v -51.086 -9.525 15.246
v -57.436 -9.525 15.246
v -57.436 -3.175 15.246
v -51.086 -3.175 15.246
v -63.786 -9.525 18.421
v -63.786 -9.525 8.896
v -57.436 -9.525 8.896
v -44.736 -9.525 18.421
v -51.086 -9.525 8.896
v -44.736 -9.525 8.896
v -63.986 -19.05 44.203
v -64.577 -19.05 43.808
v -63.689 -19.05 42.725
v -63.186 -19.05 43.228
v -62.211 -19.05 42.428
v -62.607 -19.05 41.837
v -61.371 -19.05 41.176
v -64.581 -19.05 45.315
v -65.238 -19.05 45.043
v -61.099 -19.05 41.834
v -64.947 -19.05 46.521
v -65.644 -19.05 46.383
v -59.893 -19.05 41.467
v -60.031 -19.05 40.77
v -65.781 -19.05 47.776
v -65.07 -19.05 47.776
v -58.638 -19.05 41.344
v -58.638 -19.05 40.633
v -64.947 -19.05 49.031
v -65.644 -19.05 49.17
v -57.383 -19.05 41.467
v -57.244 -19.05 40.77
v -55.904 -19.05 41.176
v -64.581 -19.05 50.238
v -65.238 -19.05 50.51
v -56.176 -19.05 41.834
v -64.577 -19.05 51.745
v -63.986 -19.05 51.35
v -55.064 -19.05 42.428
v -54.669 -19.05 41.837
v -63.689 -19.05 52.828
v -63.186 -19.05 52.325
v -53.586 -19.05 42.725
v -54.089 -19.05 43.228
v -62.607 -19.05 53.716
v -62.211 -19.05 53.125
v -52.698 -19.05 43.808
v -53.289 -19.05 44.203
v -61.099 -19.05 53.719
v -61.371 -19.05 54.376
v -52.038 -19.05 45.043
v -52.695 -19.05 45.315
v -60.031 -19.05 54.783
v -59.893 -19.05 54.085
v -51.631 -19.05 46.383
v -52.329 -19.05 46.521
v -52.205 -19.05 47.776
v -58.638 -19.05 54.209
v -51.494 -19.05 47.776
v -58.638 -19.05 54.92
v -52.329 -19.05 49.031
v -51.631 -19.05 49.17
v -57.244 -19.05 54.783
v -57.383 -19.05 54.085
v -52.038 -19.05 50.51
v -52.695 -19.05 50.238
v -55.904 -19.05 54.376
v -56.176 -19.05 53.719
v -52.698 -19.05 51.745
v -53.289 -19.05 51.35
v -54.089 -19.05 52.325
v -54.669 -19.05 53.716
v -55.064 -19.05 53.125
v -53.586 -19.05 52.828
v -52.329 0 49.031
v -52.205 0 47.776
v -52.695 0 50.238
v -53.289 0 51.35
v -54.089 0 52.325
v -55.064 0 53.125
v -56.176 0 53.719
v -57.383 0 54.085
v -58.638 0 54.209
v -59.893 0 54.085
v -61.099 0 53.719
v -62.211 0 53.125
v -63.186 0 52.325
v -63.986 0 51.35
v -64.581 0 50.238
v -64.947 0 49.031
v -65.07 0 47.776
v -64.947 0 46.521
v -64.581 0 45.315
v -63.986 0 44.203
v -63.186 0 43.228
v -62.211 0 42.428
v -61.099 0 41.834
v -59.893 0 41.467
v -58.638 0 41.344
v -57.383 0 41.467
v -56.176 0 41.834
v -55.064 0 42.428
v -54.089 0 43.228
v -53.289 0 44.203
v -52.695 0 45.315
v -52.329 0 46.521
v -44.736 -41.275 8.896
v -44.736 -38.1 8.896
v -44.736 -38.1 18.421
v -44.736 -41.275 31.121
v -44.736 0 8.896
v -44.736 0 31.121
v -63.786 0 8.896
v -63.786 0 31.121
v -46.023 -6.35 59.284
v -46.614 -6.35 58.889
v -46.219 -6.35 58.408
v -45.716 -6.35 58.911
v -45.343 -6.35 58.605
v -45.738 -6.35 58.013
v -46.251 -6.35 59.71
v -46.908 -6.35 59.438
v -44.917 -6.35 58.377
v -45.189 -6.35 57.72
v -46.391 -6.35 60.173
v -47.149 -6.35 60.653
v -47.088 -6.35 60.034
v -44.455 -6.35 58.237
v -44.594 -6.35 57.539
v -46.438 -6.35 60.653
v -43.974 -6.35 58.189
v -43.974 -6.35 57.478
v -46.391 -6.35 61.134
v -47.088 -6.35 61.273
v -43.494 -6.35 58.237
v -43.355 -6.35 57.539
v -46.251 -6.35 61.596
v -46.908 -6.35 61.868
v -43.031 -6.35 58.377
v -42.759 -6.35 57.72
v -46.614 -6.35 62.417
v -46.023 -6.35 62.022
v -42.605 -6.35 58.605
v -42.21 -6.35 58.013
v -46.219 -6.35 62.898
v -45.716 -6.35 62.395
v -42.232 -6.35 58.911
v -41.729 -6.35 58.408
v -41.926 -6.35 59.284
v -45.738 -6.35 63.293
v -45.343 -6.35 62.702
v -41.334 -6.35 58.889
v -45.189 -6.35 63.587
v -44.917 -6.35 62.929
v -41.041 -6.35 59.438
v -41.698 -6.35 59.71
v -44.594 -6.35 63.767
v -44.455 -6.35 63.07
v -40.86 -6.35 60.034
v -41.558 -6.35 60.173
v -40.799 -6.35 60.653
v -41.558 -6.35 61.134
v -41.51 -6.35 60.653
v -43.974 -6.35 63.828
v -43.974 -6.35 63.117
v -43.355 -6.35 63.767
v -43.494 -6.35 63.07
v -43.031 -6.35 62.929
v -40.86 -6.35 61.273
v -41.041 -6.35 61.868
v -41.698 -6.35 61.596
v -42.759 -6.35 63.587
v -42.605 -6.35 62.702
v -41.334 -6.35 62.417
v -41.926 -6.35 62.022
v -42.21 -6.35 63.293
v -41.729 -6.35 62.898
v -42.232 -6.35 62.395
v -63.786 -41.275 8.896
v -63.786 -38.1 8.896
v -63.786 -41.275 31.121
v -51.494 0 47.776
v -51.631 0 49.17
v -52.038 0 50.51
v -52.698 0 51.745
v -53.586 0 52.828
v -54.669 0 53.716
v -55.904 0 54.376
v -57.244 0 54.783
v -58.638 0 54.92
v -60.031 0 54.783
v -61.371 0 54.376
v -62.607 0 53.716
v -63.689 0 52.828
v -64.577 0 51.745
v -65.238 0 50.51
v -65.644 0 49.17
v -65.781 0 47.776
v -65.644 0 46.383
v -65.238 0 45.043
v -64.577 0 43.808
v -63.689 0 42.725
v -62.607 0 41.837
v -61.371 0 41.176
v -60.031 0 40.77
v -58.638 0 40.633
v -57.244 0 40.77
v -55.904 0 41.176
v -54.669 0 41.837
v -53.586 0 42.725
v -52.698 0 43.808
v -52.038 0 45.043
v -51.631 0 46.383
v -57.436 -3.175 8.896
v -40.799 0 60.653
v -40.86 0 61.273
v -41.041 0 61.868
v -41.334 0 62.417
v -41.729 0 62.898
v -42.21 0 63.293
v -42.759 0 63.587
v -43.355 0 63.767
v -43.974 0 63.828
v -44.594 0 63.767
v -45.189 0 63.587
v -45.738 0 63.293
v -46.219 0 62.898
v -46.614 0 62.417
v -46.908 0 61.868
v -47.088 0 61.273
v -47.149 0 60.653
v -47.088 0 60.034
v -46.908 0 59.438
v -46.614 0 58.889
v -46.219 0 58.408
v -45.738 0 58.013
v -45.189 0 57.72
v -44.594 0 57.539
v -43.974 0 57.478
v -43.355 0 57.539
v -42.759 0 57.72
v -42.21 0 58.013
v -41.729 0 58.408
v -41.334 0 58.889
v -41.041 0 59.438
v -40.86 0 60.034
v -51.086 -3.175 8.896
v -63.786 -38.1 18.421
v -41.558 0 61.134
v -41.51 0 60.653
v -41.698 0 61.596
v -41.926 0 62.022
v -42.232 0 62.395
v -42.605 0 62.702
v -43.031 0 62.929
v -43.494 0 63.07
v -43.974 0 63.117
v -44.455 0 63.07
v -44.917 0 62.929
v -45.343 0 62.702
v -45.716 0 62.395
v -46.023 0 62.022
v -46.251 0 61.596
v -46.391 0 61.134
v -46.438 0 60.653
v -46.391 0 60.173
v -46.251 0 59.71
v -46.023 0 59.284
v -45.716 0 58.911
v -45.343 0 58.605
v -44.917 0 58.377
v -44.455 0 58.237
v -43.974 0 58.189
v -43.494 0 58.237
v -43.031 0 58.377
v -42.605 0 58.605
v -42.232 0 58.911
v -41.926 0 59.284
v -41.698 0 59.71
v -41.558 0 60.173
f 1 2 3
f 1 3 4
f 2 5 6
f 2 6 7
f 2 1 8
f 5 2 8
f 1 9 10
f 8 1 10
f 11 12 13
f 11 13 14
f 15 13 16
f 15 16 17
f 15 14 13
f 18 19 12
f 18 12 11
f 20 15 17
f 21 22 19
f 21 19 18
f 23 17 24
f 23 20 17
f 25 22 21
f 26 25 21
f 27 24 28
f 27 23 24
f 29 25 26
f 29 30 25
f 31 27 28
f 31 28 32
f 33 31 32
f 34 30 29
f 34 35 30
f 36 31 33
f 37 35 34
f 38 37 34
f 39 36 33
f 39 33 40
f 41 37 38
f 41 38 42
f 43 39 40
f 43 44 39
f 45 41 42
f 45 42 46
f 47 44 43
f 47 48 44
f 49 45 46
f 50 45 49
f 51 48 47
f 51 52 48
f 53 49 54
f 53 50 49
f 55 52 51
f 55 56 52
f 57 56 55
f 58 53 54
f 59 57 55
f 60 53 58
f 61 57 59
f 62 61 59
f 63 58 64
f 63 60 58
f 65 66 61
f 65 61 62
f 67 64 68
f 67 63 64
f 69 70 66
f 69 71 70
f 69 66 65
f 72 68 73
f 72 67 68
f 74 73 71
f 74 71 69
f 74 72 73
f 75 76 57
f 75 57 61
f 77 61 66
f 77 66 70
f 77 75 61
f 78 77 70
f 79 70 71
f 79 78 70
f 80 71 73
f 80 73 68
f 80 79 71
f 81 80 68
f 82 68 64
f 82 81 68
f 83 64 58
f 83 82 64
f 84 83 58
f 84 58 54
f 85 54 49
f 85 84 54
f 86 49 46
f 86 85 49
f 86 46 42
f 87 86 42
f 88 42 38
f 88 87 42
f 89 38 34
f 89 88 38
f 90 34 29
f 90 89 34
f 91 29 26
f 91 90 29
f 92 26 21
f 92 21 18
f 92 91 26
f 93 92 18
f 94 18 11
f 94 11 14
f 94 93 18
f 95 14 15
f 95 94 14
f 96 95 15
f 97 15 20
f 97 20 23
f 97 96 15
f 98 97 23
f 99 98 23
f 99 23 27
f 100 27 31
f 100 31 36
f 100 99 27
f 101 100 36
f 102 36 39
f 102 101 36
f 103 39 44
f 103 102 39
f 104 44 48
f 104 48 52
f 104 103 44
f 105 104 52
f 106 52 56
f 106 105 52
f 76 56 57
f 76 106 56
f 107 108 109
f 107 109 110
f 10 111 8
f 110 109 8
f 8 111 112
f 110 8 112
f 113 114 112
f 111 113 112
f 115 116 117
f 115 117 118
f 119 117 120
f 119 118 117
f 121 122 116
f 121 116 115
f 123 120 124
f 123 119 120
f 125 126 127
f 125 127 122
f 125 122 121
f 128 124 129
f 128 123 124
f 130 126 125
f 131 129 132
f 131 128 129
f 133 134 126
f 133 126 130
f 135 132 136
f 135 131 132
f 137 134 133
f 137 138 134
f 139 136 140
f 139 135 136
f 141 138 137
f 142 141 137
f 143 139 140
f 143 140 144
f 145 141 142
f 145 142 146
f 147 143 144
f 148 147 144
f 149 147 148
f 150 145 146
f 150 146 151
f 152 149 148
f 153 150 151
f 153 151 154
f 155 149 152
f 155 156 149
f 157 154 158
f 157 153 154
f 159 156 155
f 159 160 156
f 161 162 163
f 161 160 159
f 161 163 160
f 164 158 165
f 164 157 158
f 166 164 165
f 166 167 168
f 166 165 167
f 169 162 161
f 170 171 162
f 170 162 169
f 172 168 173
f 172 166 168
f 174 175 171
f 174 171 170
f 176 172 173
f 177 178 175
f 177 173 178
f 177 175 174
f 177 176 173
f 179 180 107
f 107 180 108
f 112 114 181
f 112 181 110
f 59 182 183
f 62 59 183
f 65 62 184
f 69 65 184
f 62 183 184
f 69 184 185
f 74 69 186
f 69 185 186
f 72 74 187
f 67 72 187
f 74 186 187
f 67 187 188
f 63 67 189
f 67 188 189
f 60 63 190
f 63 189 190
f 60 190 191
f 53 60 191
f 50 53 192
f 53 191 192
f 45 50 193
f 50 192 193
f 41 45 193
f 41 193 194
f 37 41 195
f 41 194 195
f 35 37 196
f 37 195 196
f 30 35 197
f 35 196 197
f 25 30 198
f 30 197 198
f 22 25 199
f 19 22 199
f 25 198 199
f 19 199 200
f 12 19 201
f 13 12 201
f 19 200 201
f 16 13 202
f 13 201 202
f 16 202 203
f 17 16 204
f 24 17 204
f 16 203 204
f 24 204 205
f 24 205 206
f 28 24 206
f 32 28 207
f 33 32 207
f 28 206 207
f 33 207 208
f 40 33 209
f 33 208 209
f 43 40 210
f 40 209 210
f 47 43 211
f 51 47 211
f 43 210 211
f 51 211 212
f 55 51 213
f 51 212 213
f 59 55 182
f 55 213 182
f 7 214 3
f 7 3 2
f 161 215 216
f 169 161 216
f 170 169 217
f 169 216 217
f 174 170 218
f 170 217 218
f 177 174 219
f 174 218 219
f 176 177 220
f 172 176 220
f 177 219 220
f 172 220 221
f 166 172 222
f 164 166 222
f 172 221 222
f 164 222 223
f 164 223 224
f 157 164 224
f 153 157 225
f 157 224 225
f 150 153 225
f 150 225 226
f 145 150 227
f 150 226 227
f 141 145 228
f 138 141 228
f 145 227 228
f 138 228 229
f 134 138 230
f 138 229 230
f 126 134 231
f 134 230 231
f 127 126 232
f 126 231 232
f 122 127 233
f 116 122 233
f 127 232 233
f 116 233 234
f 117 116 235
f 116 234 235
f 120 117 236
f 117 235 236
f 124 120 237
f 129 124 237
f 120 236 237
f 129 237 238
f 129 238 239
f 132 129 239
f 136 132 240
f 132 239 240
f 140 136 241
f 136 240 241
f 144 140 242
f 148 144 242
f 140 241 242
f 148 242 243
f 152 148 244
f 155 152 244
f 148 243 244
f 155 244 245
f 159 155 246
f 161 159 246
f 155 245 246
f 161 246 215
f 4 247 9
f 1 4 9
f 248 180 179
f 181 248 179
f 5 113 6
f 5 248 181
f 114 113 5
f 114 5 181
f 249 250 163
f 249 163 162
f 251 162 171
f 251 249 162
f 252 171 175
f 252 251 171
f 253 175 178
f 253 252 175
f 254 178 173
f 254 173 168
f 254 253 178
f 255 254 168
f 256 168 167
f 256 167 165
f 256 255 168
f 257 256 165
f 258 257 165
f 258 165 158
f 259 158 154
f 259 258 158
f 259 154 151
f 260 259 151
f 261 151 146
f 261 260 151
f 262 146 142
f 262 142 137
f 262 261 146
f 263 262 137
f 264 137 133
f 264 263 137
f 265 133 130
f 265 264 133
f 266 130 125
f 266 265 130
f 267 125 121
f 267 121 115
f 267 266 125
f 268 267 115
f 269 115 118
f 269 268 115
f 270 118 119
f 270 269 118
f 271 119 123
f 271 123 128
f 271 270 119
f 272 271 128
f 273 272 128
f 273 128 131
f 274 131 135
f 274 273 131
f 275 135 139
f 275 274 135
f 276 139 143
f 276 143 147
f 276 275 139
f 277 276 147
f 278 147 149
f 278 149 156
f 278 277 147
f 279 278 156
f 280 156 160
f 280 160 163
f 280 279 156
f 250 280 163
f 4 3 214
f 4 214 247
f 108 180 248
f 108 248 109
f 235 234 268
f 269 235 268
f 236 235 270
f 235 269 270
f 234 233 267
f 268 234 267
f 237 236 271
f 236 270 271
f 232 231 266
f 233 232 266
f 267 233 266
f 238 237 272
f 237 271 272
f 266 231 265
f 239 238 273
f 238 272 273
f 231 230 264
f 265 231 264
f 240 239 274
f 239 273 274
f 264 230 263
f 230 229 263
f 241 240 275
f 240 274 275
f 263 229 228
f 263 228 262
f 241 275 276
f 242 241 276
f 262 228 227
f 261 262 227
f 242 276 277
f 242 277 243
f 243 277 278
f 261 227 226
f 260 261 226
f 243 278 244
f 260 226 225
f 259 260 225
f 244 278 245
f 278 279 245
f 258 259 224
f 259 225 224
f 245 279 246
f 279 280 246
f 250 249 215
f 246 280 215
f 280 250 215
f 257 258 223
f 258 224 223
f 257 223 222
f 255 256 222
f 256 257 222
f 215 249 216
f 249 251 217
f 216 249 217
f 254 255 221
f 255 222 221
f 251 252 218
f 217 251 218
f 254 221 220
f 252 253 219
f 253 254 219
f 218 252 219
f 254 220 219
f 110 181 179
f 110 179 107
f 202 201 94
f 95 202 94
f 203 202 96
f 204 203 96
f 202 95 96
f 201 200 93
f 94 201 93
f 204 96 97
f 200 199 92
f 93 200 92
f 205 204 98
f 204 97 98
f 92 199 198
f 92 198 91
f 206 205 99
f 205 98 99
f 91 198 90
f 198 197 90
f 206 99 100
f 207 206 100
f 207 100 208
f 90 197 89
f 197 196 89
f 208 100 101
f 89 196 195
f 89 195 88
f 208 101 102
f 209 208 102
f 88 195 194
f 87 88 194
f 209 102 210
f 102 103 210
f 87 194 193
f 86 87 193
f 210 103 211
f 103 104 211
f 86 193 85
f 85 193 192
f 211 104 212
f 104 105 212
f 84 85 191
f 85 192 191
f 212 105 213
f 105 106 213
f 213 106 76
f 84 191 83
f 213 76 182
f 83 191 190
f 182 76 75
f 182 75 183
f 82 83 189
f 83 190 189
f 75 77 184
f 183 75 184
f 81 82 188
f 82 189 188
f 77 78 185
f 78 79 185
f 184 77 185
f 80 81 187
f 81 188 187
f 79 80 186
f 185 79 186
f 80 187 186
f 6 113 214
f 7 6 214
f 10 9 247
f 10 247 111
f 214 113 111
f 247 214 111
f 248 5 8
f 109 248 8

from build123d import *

# Parameters (mm, degrees)
F0_R     = 7.14375
F0_R_2   = 6.43255
F1_DEPTH = 19.05
F2_R     = 3.175
F2_R_2   = 2.4638
F3_DEPTH = 6.35
F4_W     = 19.05
F4_H     = 22.225
F5_DEPTH = 41.275
F6_W     = 19.05
F6_H     = 28.575
F7_DEPTH = 9.525
F8_W     = 6.35
F8_H     = 6.35
F9_DEPTH = 6.35


with BuildPart() as f1:
    # F0 (on Front) → F1 (new body)
    with BuildSketch(Plane.XZ):
        with Locations((-58.637682, 47.776416)):
            Circle(F0_R)
        with Locations((-58.637682, 47.776416)):
            Circle(F0_R_2, mode=Mode.SUBTRACT)
    extrude(amount=F1_DEPTH)


with BuildPart() as f3:
    # F2 (on Front) → F3 (new body)
    with BuildSketch(Plane.XZ):
        with Locations((-43.974284, 60.65321)):
            Circle(F2_R)
        with Locations((-43.974284, 60.65321)):
            Circle(F2_R_2, mode=Mode.SUBTRACT)
    extrude(amount=F3_DEPTH)


with BuildPart() as f5:
    # F4 (on Front) → F5 (new body)
    with BuildSketch(Plane.XZ):
        with Locations((-54.2611, 20.008633)):
            Rectangle(F4_W, F4_H)
    extrude(amount=F5_DEPTH)

    # F6 (on face) → F7 (cut)
    with BuildSketch(Plane(origin=(0, 0, 8.896133), x_dir=(1, 0, 0), z_dir=(0, 0, -1))):
        with Locations((-54.2611, 23.8125)):
            Rectangle(F6_W, F6_H)
    extrude(amount=-F7_DEPTH, mode=Mode.SUBTRACT)

    # F8 (on face) → F9 (cut)
    with BuildSketch(Plane(origin=(0, 0, 8.896133), x_dir=(1, 0, 0), z_dir=(0, 0, -1))):
        with Locations((-54.2611, 6.35)):
            Rectangle(F8_W, F8_H)
    extrude(amount=-F9_DEPTH, mode=Mode.SUBTRACT)


solid = Compound([f1.part, f3.part, f5.part])
